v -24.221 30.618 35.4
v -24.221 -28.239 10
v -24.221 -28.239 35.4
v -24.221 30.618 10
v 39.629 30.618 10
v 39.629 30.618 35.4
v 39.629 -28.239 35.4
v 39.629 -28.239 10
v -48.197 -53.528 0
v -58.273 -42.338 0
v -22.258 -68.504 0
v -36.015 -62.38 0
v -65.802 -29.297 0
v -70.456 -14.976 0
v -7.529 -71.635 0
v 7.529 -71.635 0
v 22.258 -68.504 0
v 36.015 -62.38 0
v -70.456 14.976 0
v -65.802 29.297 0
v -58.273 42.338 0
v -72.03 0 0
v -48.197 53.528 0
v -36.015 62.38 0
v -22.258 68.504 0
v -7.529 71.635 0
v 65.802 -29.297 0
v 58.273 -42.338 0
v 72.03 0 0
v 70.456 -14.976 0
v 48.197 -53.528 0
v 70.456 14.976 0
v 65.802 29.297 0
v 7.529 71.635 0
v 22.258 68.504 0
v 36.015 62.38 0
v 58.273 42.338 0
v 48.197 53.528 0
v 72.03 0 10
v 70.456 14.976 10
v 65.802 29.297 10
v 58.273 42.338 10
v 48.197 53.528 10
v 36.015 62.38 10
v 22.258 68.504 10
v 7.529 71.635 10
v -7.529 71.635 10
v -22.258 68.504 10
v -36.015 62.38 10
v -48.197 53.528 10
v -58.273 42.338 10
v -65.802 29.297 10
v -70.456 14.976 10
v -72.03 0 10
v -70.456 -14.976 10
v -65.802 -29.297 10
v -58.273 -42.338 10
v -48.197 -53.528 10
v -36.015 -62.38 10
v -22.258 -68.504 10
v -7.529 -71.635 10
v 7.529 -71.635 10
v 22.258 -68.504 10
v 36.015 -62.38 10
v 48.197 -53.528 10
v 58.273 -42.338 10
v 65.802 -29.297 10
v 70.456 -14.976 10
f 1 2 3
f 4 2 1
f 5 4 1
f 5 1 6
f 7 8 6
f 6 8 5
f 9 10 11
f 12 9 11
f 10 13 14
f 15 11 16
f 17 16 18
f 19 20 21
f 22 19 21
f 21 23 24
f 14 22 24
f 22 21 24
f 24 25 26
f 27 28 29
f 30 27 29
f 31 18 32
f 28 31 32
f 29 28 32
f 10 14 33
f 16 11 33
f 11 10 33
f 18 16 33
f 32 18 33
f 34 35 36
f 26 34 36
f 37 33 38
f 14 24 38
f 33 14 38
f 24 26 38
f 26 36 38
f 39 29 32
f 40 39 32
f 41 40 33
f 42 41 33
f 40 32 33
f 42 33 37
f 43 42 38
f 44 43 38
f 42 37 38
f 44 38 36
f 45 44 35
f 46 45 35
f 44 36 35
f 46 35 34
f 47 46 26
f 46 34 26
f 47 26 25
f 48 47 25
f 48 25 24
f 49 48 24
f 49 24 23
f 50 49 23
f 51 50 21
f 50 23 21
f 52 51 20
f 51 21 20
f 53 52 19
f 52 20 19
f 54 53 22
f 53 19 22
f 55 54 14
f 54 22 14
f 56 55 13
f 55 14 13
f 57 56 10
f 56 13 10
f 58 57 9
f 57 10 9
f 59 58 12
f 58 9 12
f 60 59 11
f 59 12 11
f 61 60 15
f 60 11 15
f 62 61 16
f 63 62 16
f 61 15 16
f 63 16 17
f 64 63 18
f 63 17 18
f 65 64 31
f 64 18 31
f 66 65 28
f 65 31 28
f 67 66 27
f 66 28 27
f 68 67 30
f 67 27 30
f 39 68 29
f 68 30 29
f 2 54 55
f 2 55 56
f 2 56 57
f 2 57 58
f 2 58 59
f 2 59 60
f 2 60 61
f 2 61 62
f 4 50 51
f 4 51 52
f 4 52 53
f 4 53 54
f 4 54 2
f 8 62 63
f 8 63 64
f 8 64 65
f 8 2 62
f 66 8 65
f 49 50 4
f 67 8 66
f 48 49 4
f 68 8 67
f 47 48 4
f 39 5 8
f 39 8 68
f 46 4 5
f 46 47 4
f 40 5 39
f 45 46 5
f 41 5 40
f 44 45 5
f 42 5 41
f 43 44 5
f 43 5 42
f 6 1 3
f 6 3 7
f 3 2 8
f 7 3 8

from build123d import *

# Parameters (mm, degrees)
F0_R     = 72.029684
F1_DEPTH = 10
F2_W     = 63.849527
F2_H     = 58.85705
F3_DEPTH = 25.4


with BuildPart() as f1:
    # F0 (on Top) → F1 (new body)
    with BuildSketch(Plane.XY):
        Circle(F0_R)
    extrude(amount=F1_DEPTH)

    # F2 (on face) → F3 (join)
    with BuildSketch(Plane.XY.offset(10)):
        with Locations((7.703924, 1.189869)):
            Rectangle(F2_W, F2_H)
    extrude(amount=F3_DEPTH)


solid = f1.part
